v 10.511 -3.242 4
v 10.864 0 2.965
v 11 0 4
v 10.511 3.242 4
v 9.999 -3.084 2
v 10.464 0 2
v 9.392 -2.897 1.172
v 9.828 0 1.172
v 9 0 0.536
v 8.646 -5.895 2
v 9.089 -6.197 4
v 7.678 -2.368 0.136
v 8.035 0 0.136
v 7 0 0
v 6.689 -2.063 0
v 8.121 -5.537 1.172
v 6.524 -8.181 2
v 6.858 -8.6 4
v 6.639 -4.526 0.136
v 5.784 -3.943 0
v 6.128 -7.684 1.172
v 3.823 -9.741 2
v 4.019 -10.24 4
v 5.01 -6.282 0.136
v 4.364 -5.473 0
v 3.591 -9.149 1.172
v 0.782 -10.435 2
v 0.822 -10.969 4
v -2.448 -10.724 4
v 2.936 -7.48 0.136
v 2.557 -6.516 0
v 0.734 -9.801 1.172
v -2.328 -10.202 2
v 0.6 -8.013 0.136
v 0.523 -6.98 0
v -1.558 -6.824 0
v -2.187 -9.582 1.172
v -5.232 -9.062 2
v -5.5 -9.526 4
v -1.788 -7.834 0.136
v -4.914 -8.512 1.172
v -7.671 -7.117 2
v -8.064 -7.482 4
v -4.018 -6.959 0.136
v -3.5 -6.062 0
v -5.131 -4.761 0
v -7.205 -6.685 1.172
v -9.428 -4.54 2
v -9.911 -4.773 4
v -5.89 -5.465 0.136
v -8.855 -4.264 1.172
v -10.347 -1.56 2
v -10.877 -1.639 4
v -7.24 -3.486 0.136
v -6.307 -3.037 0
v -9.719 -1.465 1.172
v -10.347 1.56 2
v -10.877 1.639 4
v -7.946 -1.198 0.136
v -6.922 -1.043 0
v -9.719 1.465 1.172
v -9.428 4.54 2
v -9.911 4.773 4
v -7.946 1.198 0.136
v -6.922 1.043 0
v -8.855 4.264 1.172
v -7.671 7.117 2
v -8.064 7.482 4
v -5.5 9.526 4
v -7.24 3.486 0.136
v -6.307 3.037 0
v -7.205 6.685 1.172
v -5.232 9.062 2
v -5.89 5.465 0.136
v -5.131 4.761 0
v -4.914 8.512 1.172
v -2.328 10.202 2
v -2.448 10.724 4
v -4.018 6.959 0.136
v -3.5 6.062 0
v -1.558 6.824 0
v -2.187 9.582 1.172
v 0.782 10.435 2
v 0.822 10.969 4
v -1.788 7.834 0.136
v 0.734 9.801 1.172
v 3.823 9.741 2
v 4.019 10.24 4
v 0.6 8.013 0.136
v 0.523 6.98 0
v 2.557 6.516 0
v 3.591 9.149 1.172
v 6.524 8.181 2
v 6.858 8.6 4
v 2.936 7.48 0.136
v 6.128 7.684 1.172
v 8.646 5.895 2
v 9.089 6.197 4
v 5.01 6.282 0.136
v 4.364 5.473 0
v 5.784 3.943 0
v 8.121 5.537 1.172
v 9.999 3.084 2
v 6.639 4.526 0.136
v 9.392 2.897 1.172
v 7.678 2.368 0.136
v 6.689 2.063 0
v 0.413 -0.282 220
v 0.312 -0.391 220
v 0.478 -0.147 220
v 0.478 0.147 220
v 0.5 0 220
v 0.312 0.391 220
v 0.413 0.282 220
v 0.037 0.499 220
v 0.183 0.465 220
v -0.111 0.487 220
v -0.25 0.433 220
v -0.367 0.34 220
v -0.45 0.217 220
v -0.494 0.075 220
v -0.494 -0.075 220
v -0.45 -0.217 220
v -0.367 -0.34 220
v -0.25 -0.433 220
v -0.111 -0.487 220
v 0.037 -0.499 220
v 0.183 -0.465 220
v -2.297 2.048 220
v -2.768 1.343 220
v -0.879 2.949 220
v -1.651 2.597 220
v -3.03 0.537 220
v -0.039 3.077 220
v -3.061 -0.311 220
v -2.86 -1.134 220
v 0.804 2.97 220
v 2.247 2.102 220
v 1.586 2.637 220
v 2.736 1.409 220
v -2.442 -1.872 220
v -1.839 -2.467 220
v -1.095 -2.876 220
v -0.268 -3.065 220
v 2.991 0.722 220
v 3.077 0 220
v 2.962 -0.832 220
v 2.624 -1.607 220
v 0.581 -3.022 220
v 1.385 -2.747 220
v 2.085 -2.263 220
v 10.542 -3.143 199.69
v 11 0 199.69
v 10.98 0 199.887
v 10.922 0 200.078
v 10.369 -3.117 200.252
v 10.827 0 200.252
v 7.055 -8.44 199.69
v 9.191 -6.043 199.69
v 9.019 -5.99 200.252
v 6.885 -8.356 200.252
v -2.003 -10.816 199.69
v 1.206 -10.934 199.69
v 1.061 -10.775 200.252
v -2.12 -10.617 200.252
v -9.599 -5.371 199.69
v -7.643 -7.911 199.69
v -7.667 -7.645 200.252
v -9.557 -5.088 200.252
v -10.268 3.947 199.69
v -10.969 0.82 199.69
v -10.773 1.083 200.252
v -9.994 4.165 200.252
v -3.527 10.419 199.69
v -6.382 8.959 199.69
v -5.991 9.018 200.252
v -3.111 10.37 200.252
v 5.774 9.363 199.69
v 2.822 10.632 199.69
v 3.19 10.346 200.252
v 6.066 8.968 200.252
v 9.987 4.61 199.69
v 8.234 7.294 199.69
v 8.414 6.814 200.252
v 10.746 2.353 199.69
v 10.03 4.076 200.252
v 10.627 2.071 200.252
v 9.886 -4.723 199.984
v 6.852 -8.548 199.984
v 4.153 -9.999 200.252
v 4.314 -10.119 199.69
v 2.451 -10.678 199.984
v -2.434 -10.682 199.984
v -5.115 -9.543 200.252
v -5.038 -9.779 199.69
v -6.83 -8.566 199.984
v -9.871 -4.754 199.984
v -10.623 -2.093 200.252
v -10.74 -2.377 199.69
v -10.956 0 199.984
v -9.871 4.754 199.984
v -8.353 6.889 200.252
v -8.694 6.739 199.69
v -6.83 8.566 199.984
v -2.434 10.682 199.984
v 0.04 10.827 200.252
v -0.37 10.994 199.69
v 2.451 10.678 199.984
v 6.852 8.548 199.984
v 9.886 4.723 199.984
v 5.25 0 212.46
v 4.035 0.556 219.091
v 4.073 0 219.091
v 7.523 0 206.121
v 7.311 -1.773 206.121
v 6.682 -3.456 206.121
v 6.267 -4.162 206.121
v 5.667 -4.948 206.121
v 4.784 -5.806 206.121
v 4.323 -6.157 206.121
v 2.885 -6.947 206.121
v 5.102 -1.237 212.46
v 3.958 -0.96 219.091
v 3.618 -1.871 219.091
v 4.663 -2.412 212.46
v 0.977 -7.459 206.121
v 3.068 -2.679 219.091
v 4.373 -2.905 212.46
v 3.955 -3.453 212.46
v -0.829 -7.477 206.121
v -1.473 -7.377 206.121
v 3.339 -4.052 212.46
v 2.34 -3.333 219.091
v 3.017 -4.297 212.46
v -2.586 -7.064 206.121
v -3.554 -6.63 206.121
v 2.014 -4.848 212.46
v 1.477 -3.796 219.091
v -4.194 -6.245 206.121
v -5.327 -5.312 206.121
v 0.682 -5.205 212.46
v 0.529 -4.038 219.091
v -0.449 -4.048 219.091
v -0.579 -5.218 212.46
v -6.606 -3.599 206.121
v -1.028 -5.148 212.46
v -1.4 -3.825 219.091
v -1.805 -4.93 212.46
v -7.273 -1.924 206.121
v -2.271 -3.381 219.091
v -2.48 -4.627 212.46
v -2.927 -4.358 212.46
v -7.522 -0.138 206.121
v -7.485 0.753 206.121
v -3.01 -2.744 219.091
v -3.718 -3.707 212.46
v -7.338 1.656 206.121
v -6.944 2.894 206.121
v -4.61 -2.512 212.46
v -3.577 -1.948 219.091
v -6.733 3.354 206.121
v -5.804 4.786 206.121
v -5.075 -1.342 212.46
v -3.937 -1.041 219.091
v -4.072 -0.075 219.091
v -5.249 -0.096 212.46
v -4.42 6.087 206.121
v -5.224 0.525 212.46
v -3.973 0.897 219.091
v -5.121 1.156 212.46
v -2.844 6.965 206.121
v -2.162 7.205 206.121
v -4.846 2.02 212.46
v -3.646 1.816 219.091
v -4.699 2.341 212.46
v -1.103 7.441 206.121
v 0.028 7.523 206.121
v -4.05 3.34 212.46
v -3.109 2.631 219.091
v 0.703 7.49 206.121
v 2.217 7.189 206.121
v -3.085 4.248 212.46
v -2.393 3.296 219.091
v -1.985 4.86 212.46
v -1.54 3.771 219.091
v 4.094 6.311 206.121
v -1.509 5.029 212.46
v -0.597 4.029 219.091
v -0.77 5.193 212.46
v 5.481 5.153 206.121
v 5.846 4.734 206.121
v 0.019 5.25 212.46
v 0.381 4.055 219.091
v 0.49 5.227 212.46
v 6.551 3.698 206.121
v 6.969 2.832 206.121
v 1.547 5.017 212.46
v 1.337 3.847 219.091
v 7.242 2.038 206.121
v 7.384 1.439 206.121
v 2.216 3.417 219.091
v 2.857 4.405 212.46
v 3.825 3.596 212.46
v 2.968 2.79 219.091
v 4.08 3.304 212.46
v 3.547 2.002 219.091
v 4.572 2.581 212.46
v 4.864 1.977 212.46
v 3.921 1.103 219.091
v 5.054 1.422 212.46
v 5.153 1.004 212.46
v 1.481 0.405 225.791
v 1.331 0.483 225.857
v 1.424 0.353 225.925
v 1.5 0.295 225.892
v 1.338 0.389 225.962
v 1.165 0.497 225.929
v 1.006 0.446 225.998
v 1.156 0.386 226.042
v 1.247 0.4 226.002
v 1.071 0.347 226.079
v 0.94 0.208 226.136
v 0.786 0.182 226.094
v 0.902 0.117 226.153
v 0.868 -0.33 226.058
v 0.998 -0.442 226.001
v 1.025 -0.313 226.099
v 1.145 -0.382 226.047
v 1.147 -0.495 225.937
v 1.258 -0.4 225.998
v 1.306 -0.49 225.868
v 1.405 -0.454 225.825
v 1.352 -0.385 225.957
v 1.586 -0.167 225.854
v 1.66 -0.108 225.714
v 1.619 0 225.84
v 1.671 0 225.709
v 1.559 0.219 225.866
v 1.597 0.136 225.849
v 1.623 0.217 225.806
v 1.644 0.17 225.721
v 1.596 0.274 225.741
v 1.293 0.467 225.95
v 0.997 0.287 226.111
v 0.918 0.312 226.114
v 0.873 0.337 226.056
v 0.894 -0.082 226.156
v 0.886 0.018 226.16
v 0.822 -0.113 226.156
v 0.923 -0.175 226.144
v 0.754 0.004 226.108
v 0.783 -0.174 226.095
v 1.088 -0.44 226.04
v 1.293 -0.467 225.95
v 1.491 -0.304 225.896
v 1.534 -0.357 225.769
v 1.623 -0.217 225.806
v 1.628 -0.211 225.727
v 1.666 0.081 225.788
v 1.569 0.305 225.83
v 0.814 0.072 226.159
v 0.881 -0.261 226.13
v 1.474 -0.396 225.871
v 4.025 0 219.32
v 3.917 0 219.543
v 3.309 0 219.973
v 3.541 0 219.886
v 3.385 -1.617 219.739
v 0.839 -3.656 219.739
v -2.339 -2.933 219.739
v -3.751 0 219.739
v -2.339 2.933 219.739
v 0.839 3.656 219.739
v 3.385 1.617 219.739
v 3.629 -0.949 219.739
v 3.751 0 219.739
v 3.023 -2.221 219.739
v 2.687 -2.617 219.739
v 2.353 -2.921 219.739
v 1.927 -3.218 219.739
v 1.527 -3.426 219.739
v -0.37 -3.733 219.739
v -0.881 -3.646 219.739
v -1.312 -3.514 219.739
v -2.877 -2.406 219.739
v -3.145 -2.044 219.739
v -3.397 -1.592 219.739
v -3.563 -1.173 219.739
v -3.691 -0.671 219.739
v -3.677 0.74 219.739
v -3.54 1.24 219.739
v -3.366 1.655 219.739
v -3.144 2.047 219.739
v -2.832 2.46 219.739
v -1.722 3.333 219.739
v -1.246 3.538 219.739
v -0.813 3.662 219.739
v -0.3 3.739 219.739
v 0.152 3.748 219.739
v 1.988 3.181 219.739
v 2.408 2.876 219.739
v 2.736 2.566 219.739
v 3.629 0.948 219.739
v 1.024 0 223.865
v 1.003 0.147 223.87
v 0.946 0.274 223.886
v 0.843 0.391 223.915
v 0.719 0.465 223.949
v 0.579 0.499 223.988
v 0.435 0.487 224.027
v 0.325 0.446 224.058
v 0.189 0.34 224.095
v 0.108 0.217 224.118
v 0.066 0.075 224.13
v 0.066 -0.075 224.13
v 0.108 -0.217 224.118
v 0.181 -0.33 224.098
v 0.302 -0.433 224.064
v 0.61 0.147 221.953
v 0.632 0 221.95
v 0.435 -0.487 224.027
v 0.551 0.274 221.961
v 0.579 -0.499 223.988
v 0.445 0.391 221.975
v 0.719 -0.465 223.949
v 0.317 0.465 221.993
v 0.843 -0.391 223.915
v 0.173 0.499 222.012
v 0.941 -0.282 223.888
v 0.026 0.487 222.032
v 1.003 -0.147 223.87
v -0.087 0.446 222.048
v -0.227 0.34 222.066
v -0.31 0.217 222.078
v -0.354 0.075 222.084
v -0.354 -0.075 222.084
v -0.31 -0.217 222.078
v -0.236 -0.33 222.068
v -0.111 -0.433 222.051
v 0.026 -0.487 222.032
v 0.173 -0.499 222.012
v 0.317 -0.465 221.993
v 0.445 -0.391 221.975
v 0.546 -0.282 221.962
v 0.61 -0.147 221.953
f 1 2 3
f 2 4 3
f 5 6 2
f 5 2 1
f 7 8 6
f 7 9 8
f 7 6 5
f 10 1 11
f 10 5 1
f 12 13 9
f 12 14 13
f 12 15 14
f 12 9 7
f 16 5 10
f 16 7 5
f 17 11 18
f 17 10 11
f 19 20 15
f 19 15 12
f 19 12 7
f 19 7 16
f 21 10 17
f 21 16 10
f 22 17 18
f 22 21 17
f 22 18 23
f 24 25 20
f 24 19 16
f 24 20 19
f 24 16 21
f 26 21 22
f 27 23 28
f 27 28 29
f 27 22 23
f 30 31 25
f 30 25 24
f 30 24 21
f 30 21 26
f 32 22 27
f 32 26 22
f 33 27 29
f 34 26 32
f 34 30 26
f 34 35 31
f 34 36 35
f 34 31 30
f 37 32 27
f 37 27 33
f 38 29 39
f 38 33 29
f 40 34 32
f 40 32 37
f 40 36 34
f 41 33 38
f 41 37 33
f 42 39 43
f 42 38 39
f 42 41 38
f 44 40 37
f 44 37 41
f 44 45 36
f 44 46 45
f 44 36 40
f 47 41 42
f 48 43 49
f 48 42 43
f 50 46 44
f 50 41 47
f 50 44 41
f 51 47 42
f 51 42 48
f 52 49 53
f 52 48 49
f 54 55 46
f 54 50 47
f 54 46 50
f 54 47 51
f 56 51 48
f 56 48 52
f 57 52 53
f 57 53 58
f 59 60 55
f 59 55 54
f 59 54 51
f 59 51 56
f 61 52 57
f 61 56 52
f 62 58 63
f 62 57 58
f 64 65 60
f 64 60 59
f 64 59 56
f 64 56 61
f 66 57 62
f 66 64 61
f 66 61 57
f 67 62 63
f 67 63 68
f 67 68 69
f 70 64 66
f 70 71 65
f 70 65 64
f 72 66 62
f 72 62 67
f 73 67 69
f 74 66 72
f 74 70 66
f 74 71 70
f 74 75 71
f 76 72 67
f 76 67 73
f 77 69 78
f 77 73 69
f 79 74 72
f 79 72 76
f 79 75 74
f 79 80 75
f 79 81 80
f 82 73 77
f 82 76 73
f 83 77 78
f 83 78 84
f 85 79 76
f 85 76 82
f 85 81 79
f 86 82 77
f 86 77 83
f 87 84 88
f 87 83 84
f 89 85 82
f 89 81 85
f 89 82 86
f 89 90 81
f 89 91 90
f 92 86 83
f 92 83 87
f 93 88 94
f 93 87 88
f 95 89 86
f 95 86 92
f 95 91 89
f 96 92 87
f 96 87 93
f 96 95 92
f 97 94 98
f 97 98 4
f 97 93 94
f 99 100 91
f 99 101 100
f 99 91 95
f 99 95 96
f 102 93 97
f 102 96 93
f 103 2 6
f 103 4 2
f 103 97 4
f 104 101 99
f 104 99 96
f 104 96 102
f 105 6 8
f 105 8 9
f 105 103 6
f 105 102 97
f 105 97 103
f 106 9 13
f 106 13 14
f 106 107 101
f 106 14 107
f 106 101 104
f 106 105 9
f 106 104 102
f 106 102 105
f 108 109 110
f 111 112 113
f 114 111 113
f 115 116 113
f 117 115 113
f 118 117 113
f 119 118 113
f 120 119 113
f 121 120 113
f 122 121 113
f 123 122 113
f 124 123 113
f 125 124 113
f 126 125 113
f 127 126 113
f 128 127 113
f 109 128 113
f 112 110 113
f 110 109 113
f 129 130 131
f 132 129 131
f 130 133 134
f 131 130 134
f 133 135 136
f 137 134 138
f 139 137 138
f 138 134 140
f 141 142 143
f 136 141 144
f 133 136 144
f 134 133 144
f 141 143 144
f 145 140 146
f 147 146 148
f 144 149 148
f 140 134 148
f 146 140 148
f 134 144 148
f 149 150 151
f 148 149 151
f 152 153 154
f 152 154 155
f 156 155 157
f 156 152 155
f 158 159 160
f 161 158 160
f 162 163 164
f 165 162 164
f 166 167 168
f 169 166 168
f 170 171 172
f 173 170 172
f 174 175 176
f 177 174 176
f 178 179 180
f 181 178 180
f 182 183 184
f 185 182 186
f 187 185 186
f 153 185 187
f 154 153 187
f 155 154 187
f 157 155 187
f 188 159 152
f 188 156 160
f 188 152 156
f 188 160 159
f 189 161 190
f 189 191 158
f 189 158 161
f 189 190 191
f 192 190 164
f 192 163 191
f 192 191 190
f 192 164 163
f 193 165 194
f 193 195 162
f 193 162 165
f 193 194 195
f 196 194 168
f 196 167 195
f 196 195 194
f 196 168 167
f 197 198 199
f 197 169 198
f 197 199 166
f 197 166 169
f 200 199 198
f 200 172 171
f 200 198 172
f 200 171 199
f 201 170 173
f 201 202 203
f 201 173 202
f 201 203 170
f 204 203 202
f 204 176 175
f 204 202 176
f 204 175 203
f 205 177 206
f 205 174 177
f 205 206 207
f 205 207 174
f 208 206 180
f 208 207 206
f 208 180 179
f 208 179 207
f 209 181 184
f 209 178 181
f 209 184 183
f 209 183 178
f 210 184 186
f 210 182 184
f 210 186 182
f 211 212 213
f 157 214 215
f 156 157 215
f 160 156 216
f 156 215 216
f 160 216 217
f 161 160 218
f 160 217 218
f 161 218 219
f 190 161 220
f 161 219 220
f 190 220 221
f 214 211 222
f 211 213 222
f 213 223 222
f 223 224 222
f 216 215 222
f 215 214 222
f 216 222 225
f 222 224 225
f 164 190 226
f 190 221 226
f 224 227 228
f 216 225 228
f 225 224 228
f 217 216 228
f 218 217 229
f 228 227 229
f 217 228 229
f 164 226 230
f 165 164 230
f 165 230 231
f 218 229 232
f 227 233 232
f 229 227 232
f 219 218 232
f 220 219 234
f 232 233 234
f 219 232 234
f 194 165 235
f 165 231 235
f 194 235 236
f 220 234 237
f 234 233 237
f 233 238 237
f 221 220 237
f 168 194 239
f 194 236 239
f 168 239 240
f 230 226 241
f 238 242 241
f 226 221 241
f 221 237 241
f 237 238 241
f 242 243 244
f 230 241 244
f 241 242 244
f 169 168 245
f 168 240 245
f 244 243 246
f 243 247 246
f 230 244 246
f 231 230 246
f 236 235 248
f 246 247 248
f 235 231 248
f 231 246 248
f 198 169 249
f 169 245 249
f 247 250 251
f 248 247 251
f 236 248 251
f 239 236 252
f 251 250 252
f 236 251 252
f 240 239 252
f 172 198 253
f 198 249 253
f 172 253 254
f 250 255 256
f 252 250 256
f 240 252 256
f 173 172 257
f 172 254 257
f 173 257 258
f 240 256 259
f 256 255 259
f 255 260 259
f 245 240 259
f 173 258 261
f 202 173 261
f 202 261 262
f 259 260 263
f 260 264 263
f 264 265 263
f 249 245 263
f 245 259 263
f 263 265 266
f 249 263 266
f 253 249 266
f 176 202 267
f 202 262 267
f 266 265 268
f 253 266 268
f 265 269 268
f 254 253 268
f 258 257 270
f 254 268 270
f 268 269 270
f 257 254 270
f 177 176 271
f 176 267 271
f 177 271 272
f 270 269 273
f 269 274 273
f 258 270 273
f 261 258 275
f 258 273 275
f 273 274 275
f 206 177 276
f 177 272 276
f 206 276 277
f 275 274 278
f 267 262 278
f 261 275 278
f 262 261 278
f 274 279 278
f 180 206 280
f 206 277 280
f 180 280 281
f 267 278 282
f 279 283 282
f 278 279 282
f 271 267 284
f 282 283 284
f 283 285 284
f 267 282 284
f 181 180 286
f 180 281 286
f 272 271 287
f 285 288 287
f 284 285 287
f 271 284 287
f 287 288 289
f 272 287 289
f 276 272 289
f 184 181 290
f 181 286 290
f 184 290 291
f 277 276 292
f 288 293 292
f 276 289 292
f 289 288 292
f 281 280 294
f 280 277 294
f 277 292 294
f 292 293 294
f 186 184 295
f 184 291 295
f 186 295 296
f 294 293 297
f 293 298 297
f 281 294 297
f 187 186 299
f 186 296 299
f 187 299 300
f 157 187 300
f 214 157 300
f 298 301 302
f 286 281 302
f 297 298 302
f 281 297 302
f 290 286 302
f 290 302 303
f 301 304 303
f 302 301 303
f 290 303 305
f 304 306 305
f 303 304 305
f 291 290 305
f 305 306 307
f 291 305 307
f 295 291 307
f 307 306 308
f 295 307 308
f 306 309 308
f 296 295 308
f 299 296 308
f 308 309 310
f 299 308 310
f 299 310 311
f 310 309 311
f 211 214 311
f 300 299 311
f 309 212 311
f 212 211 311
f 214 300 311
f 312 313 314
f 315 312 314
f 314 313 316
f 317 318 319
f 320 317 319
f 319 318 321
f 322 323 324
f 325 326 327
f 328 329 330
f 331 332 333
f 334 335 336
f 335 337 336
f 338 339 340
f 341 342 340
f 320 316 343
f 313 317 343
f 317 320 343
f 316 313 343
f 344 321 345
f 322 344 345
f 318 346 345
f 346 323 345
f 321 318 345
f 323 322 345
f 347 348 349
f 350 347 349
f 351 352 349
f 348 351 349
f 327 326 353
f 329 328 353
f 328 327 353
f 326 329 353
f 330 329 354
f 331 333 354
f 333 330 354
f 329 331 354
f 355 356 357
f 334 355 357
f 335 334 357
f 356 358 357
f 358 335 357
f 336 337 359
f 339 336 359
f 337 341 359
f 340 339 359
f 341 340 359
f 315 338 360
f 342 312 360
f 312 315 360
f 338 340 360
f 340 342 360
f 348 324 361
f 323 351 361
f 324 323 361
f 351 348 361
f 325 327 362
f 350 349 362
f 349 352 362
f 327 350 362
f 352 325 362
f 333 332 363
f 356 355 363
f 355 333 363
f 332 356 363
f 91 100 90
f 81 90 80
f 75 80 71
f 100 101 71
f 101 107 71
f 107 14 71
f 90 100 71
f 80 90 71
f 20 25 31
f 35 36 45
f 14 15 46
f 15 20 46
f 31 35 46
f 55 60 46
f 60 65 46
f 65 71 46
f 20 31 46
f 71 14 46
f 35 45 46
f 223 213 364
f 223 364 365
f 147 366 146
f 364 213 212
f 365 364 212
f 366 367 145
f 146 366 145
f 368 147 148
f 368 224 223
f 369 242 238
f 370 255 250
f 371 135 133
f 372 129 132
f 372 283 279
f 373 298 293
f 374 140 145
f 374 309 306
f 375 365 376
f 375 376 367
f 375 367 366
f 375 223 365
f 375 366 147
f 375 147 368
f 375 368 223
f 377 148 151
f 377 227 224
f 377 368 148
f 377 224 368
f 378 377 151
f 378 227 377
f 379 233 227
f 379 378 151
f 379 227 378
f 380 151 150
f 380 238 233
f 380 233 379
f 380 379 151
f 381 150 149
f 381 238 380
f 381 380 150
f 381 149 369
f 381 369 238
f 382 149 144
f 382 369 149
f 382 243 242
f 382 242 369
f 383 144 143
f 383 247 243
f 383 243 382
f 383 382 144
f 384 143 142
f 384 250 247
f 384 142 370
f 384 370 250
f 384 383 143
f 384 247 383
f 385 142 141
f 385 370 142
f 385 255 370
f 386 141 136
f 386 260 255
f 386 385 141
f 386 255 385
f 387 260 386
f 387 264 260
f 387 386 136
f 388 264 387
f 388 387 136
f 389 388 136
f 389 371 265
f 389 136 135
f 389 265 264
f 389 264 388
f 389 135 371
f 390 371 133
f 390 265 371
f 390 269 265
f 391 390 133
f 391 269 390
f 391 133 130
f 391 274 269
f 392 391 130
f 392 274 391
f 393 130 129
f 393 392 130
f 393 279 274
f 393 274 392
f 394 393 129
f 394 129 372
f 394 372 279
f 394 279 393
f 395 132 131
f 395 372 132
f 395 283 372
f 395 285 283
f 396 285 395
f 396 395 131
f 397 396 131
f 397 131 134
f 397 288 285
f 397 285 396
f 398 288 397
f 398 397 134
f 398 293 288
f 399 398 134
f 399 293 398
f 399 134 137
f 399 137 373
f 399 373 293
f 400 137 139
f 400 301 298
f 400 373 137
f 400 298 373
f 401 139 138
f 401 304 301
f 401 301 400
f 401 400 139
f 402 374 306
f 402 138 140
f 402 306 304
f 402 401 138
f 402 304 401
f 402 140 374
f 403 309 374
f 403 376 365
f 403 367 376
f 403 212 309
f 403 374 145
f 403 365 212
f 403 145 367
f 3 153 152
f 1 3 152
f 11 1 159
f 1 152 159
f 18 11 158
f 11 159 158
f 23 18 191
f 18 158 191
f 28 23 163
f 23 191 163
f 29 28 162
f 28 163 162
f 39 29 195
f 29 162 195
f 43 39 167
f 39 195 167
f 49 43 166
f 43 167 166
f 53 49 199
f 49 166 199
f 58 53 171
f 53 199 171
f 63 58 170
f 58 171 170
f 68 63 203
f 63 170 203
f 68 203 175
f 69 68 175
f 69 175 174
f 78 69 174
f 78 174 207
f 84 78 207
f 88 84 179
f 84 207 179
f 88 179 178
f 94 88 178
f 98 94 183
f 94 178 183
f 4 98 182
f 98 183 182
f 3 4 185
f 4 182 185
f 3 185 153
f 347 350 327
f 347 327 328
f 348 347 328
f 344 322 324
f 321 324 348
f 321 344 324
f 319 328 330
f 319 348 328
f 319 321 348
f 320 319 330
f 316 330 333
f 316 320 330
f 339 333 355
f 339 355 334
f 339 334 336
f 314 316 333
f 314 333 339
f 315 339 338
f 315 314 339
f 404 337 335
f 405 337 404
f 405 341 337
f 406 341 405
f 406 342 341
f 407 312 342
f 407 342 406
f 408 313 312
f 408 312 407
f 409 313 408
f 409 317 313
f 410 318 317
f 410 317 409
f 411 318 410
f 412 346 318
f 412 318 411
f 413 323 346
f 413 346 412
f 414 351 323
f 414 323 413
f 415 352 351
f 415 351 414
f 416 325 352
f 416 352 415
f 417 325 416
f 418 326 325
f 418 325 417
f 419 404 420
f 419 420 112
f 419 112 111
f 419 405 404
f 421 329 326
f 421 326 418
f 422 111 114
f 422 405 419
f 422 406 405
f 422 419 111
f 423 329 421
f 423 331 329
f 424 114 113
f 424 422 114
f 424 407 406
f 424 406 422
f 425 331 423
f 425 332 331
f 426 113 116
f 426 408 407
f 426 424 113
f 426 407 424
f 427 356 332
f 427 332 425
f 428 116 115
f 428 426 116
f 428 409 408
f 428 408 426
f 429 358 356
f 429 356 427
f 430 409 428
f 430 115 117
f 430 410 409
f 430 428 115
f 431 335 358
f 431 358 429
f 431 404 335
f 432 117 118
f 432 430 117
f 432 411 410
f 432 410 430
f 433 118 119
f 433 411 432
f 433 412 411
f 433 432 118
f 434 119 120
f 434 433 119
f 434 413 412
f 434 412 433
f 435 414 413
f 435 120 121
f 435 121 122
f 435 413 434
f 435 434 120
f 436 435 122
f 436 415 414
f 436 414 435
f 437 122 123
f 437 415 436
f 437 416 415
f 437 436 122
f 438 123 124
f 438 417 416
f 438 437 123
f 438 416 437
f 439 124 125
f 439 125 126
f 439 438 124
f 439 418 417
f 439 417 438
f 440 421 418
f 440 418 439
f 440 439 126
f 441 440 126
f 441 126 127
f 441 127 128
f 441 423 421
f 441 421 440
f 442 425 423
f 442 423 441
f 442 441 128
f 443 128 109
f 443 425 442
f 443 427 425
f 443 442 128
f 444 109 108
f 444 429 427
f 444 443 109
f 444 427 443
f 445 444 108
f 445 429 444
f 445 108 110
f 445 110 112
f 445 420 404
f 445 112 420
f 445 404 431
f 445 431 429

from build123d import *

# Parameters (mm, degrees)
F3_R = 0.5
F5_R = 1
F6_R = 0.1
F7_R = 4


with BuildPart() as f1:
    # F0 (on Front) → F1 (revolve)
    with BuildSketch(Plane.XZ):
        with BuildLine():
            Line((0, 220), (0, 0))
            Line((0, 0), (11, 0))
            Line((11, 0), (11, 200))
            ThreePointArc((11, 200), (6.1515684949, 209.5280489732), (4, 220))
            Line((4, 220), (0, 220))
        make_face()
    revolve(axis=Axis((0, 0, 110), (0, 0, -1)))

    # F5
    f5_edges = [f1.edges().sort_by_distance(p)[0] for p in [
        (-4, 0, 220),
        (-11, 0, 200),
    ]]
    fillet(f5_edges, radius=F5_R)

    # F7
    f7_edges = [f1.edges().sort_by_distance(p)[0] for p in [
        (-11, 0, 0),
    ]]
    fillet(f7_edges, radius=F7_R)


with BuildPart() as f4:
    # F4: sweep along a path in F2
    with BuildLine(Plane.XZ) as f4_path:
        ThreePointArc((1.2522729151, 226), (0.316405306, 223.0646446553), (0, 220))
    # F3 (on face) → F4 (sweep)
    with BuildSketch(Plane.XY.offset(220)):
        Circle(F3_R)
    sweep(path=f4_path.line)

    # F6
    f6_edges = [f4.edges().sort_by_distance(p)[0] for p in [
        (0.794015, 0, 226.2),
    ]]
    fillet(f6_edges, radius=F6_R)


solid = Compound([f1.part, f4.part])
